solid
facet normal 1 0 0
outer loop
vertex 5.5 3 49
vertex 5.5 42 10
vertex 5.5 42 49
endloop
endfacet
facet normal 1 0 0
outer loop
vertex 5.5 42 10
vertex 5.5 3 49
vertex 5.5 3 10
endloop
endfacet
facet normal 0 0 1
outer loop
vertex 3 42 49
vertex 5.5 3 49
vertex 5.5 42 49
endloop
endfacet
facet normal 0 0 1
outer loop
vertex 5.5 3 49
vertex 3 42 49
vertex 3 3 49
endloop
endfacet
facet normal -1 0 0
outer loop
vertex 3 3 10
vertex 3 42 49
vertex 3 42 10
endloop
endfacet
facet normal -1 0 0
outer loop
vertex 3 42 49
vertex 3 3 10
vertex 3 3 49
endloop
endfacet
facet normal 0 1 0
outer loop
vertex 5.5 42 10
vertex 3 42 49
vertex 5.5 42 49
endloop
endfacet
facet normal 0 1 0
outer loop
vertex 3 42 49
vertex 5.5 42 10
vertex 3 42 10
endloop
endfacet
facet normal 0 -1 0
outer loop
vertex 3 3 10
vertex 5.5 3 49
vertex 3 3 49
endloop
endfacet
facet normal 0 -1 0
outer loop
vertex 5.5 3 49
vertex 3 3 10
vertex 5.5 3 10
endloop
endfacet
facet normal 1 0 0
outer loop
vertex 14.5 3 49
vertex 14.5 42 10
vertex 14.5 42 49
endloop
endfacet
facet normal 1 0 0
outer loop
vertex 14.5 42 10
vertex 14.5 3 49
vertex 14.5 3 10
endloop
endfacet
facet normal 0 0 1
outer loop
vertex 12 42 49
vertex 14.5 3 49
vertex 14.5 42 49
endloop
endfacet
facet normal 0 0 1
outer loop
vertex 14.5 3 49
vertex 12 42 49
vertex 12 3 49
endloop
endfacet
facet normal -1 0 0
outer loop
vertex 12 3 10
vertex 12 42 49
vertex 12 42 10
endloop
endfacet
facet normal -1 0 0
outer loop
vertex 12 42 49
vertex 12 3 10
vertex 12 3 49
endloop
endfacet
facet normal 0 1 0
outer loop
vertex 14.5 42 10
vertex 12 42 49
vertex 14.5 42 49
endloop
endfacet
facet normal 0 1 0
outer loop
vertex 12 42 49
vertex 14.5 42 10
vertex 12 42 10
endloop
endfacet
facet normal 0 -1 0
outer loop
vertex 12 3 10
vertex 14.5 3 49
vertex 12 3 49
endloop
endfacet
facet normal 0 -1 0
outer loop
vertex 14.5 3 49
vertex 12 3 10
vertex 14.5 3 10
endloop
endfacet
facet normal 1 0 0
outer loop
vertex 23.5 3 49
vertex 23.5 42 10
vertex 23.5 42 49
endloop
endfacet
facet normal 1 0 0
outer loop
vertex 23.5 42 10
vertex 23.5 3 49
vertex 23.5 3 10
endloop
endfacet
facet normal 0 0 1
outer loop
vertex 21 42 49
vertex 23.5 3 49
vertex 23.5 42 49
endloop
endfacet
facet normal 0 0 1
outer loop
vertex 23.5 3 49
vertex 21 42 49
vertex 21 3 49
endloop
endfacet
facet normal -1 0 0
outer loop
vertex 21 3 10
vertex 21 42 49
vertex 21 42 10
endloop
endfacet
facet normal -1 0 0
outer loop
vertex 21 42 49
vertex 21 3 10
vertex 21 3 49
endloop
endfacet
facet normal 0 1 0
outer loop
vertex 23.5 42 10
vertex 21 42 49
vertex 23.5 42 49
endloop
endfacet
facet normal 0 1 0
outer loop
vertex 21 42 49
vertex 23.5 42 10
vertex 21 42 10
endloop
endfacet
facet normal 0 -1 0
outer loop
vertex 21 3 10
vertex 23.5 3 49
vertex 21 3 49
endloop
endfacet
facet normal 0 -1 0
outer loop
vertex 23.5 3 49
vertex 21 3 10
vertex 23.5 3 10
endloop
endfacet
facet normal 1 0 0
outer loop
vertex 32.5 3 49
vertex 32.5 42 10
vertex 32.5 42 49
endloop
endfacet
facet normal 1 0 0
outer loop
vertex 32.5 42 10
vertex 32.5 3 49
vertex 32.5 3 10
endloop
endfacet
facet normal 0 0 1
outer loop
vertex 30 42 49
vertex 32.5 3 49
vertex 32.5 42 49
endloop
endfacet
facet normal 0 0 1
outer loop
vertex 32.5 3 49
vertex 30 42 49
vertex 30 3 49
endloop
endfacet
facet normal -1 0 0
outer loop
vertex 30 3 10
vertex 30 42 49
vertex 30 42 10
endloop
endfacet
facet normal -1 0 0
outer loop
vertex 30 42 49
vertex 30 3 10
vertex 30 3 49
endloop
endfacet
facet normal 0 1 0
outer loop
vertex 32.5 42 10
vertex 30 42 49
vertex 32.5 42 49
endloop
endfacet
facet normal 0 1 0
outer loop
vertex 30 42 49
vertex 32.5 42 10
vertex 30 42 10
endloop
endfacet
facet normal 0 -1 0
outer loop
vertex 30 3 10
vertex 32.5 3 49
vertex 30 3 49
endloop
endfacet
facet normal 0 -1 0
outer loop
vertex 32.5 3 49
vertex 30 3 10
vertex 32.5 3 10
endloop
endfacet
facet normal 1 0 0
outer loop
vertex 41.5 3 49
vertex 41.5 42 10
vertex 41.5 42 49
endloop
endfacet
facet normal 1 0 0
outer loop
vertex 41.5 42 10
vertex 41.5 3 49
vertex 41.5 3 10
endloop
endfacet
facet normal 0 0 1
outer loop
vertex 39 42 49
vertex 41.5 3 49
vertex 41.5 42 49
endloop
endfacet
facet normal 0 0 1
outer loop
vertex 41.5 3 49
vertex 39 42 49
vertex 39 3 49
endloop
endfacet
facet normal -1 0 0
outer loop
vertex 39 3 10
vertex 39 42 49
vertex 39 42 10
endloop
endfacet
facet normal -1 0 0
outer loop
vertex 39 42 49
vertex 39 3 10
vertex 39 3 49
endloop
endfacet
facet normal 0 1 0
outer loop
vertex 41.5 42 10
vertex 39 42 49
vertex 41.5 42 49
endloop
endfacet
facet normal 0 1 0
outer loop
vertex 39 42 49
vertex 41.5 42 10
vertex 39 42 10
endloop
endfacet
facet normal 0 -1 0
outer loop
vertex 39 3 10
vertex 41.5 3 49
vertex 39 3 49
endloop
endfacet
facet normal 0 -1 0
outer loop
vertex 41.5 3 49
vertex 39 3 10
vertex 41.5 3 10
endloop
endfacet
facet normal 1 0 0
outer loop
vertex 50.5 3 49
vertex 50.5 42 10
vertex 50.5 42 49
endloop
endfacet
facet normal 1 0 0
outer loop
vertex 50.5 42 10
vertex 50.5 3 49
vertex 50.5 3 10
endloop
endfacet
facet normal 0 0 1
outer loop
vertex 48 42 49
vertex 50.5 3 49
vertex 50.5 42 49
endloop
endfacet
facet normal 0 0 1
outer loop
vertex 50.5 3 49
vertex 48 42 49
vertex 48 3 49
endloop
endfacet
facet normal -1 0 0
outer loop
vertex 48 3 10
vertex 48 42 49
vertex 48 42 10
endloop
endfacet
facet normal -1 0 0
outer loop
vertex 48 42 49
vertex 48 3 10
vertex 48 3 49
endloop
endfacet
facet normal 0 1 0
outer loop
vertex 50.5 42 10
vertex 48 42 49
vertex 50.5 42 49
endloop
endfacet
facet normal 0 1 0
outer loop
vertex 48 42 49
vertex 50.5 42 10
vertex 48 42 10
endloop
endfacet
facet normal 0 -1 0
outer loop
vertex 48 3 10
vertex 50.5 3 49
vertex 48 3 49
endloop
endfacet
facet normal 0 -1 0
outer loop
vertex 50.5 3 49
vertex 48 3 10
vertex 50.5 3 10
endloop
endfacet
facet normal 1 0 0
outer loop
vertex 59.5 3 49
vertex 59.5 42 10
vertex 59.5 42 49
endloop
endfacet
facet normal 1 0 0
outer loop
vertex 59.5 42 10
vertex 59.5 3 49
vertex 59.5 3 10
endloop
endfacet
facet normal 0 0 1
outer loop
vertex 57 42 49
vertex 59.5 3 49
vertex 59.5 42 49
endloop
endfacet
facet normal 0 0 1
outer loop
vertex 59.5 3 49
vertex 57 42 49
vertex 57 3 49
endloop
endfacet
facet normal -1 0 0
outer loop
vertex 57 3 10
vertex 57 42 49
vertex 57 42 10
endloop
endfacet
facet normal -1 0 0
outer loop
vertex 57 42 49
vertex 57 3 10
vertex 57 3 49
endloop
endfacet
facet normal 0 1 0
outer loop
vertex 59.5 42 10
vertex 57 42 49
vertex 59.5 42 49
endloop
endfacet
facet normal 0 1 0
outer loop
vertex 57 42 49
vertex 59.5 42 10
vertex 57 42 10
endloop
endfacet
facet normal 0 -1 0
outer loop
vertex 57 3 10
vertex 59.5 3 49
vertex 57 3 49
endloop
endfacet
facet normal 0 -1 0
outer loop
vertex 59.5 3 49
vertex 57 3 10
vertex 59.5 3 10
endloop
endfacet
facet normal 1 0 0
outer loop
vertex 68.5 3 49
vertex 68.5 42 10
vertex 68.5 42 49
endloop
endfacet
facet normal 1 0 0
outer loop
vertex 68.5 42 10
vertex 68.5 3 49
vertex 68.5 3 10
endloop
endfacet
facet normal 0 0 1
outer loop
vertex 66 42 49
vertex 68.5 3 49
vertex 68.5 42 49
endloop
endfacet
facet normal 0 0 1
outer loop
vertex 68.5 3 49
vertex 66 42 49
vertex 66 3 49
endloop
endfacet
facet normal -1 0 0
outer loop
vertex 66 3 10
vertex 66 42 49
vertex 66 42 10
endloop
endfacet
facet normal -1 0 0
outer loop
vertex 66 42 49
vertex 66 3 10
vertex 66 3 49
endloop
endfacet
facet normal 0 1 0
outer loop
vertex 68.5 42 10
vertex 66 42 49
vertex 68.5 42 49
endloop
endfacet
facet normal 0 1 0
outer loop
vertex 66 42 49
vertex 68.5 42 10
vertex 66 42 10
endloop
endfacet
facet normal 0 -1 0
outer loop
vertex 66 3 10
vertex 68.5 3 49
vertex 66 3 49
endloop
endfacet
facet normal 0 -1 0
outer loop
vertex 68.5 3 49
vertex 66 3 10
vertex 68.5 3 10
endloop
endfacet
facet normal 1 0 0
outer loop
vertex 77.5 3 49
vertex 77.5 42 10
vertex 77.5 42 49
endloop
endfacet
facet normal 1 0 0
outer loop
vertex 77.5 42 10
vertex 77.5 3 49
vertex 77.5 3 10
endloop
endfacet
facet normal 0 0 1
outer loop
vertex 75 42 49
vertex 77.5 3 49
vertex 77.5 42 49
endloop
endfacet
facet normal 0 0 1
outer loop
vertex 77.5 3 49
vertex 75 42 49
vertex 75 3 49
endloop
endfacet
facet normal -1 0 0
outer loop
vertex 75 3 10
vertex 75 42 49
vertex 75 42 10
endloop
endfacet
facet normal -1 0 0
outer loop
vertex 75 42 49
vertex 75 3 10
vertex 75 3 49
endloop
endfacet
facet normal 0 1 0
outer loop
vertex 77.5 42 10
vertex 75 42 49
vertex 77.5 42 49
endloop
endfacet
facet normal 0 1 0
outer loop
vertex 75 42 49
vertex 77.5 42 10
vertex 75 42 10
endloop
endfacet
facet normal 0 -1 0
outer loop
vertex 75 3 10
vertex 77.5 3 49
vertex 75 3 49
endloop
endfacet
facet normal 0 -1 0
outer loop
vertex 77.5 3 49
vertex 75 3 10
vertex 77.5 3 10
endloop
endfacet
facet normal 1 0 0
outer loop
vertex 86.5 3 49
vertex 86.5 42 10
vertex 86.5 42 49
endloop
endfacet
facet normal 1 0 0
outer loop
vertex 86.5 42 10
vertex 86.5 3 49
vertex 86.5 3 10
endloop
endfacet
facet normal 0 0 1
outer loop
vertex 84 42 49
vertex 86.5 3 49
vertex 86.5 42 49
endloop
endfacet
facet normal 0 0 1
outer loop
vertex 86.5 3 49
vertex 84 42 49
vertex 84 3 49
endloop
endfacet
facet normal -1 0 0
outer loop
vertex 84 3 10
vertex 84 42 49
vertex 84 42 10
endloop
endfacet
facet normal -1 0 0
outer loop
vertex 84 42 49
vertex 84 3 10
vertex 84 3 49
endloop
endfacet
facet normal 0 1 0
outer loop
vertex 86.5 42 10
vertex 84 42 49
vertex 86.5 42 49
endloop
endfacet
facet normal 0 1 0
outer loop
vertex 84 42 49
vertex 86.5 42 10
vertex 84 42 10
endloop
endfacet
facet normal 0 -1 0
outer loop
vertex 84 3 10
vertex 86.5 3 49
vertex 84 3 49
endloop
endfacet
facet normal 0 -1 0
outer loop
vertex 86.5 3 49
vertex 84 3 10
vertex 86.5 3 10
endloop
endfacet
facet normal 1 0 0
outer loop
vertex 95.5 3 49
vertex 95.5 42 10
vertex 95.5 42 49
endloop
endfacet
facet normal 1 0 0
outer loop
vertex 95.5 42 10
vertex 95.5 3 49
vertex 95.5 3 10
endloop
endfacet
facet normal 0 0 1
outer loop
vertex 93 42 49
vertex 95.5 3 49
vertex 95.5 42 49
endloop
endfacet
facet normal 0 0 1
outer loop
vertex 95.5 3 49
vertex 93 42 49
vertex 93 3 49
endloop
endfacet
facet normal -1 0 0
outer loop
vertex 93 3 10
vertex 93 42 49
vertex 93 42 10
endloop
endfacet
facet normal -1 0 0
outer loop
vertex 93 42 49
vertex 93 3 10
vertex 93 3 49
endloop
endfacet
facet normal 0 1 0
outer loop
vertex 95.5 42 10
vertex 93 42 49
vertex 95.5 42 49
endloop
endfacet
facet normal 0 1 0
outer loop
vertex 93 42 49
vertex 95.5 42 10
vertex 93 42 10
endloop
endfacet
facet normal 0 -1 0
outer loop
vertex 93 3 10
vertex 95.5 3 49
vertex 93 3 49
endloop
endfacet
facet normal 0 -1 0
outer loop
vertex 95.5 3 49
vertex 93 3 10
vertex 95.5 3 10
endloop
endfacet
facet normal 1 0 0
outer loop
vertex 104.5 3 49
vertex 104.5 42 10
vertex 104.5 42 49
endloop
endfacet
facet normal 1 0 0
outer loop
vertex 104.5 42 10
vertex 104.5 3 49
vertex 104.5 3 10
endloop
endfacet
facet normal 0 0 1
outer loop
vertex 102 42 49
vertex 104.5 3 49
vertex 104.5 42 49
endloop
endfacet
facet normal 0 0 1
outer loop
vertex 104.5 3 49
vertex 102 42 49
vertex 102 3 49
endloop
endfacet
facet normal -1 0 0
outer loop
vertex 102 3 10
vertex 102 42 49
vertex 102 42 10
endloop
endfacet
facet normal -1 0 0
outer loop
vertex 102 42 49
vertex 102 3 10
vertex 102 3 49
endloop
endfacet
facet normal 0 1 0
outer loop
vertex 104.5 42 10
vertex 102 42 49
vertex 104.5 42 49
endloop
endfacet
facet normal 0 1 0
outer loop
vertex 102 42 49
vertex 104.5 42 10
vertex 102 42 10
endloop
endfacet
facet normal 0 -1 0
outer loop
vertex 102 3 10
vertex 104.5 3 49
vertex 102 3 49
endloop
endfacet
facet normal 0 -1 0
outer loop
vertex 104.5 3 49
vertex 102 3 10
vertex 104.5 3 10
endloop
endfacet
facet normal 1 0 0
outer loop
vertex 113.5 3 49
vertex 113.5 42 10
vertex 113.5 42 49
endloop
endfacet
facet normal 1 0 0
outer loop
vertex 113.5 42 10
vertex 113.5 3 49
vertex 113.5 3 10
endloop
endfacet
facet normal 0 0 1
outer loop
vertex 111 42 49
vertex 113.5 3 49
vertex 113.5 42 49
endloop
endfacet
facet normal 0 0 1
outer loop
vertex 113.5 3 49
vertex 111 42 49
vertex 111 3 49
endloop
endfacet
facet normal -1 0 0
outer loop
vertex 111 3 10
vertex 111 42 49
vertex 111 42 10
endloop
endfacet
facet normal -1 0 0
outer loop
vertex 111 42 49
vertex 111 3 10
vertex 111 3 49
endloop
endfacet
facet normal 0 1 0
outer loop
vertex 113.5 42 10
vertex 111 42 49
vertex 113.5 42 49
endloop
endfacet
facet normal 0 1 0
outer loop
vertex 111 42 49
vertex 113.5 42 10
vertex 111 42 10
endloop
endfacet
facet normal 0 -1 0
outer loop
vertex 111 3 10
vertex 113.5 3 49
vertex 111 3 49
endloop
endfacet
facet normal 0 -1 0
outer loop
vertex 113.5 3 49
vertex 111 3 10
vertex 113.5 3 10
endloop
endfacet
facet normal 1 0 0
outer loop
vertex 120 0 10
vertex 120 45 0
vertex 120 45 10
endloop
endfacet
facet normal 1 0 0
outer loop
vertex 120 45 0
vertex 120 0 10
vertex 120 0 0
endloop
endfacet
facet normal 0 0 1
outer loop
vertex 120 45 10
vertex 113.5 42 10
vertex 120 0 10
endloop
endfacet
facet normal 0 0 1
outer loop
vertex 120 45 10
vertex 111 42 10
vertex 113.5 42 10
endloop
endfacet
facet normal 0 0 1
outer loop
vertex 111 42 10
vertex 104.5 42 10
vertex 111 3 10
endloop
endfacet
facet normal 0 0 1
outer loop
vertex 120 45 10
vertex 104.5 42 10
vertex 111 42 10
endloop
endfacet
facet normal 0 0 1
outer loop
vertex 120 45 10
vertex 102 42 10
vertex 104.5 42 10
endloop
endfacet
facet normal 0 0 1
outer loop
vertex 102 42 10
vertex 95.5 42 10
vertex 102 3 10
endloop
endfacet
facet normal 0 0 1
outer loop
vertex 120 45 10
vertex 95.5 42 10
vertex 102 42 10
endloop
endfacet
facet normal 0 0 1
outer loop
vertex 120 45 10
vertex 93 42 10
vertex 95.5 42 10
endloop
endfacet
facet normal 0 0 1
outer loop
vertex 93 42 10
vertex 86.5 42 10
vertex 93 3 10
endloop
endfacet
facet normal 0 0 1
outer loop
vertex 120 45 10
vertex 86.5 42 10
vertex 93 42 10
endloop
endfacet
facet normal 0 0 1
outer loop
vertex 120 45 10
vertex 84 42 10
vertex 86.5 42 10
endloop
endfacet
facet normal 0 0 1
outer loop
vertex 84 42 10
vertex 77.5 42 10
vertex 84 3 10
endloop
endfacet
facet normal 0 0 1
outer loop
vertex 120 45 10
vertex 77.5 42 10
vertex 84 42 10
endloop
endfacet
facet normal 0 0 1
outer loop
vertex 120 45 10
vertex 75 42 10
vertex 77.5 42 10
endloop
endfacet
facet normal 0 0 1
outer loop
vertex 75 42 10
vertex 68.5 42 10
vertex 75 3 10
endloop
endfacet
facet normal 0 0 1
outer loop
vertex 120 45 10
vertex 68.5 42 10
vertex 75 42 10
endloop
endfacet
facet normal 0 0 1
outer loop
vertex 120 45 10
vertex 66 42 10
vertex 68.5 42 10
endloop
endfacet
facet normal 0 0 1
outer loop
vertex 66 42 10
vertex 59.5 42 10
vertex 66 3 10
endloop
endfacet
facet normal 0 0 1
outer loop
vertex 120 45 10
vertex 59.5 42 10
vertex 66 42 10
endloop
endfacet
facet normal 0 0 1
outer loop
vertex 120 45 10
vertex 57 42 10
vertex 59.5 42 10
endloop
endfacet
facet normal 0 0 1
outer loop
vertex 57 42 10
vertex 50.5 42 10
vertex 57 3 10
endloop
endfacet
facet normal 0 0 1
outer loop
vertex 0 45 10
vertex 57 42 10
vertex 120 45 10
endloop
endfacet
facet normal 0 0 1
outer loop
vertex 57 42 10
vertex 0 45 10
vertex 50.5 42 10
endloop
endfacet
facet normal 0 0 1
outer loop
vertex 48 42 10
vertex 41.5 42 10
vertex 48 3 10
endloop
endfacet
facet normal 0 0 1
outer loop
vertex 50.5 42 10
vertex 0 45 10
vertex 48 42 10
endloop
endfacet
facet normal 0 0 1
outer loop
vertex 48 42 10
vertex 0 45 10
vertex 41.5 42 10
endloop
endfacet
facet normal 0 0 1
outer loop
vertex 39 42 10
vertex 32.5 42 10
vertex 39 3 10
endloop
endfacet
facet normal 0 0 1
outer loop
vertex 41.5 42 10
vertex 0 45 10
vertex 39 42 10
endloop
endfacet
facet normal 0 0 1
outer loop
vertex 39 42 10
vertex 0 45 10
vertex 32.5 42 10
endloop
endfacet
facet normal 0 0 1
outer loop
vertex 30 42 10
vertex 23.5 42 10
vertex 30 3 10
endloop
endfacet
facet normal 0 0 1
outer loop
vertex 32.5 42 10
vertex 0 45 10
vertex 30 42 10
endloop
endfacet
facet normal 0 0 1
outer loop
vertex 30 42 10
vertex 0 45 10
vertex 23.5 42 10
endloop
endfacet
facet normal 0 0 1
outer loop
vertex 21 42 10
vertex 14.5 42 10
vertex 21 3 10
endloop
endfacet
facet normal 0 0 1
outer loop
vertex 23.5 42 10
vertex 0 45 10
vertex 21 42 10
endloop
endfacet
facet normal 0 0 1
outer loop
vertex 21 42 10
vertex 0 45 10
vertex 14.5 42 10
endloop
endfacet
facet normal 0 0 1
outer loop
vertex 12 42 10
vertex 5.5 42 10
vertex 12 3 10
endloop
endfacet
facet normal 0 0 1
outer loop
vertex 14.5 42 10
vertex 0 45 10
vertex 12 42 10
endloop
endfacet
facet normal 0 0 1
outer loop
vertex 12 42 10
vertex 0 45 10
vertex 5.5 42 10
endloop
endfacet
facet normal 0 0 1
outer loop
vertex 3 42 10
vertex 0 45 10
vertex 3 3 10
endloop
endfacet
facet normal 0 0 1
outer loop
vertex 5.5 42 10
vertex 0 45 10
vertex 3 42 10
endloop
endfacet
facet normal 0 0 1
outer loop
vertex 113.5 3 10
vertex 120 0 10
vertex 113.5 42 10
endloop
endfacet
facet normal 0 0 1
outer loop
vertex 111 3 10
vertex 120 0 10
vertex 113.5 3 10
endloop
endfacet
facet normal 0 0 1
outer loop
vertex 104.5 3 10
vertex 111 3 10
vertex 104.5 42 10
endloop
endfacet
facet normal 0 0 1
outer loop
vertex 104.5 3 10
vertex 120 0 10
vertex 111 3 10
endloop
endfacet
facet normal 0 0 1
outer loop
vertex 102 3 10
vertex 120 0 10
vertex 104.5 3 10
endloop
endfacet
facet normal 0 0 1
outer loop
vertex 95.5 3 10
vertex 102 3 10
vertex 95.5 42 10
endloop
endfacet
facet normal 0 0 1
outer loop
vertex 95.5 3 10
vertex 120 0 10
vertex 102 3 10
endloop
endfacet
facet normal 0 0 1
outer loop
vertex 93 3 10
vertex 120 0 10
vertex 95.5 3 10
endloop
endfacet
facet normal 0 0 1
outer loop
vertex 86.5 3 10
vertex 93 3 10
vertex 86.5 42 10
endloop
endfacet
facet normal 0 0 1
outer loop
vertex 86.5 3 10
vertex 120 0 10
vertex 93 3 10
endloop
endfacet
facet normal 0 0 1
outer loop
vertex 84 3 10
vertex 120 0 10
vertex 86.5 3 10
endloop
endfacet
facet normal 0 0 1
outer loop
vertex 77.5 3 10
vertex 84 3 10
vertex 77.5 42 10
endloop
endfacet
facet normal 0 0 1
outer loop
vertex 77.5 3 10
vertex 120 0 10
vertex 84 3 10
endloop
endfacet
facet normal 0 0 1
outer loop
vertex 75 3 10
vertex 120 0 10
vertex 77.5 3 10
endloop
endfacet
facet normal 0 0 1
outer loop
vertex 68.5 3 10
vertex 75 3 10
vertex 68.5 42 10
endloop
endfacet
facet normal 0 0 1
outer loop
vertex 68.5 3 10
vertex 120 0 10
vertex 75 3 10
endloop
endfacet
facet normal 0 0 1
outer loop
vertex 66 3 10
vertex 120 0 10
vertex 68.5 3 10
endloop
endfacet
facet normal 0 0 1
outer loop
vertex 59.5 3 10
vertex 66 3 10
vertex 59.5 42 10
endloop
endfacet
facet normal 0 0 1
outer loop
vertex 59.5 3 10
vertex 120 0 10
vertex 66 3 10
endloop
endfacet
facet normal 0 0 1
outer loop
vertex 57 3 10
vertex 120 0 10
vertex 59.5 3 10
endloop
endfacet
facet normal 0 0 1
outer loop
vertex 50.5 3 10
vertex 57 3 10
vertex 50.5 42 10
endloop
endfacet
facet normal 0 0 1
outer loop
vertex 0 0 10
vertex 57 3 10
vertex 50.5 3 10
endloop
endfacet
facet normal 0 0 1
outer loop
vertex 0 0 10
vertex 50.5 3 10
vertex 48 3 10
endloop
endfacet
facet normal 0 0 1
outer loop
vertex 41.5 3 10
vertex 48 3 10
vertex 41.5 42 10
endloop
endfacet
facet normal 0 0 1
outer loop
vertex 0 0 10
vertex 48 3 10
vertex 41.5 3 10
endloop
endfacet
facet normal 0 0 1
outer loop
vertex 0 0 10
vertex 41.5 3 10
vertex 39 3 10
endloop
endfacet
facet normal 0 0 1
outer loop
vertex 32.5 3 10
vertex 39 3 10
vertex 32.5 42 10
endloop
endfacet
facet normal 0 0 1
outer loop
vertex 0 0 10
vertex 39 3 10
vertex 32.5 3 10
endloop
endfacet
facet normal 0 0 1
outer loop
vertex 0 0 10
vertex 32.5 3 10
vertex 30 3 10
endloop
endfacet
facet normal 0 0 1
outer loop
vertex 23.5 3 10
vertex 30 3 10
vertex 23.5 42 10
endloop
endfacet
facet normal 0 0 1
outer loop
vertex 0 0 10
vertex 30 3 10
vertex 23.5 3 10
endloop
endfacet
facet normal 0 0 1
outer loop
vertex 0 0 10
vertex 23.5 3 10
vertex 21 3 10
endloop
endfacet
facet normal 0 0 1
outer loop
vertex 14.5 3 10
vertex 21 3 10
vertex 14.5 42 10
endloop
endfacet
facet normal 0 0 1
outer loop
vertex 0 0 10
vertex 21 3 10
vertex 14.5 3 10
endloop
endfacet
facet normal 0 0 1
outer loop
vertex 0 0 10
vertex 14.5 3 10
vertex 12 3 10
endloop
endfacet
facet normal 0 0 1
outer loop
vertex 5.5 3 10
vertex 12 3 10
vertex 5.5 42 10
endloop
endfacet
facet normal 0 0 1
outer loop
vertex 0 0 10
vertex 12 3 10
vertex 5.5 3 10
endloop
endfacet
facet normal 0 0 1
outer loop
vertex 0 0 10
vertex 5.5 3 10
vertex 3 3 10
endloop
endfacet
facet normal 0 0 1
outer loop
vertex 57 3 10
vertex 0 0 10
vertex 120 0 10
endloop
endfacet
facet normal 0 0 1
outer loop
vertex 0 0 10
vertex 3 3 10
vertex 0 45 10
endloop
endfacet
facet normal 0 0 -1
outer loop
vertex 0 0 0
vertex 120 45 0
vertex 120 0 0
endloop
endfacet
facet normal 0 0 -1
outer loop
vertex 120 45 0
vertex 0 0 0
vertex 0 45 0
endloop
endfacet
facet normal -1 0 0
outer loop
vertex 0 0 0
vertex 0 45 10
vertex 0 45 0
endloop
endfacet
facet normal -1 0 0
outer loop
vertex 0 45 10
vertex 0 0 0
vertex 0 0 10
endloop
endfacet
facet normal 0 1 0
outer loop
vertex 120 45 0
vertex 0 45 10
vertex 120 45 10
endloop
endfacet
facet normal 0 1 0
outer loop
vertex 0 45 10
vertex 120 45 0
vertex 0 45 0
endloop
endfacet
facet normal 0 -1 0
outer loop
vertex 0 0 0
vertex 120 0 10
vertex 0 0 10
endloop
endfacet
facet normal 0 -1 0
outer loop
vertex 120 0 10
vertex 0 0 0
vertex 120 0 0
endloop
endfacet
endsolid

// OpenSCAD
$fn = 32;

// ----------------------------------------------------------------------
// Heatsink: uniform fin block
// ----------------------------------------------------------------------

// --- parameters (mm) ---
base_l = 120;             // base length, X
base_w = 45;              // base width, Y
base_t = 10;              // base plate thickness
fin_h = 40;               // fin height above the base
fin_t = 2.5;              // fin thickness
edge = 3;                 // margin from the base ends
pitch = 9;                // fin pitch

n_fins = floor((base_l - 2 * edge - fin_t) / pitch) + 1;  // fin count
total_h = base_t + fin_h - 1;  // overall height

union() {
  cube([base_l, base_w, base_t]);
  for (i = [0 : n_fins - 1])
    translate([edge + i * pitch, edge, base_t - 1])
      cube([fin_t, base_w - 2 * edge, fin_h]);
}
